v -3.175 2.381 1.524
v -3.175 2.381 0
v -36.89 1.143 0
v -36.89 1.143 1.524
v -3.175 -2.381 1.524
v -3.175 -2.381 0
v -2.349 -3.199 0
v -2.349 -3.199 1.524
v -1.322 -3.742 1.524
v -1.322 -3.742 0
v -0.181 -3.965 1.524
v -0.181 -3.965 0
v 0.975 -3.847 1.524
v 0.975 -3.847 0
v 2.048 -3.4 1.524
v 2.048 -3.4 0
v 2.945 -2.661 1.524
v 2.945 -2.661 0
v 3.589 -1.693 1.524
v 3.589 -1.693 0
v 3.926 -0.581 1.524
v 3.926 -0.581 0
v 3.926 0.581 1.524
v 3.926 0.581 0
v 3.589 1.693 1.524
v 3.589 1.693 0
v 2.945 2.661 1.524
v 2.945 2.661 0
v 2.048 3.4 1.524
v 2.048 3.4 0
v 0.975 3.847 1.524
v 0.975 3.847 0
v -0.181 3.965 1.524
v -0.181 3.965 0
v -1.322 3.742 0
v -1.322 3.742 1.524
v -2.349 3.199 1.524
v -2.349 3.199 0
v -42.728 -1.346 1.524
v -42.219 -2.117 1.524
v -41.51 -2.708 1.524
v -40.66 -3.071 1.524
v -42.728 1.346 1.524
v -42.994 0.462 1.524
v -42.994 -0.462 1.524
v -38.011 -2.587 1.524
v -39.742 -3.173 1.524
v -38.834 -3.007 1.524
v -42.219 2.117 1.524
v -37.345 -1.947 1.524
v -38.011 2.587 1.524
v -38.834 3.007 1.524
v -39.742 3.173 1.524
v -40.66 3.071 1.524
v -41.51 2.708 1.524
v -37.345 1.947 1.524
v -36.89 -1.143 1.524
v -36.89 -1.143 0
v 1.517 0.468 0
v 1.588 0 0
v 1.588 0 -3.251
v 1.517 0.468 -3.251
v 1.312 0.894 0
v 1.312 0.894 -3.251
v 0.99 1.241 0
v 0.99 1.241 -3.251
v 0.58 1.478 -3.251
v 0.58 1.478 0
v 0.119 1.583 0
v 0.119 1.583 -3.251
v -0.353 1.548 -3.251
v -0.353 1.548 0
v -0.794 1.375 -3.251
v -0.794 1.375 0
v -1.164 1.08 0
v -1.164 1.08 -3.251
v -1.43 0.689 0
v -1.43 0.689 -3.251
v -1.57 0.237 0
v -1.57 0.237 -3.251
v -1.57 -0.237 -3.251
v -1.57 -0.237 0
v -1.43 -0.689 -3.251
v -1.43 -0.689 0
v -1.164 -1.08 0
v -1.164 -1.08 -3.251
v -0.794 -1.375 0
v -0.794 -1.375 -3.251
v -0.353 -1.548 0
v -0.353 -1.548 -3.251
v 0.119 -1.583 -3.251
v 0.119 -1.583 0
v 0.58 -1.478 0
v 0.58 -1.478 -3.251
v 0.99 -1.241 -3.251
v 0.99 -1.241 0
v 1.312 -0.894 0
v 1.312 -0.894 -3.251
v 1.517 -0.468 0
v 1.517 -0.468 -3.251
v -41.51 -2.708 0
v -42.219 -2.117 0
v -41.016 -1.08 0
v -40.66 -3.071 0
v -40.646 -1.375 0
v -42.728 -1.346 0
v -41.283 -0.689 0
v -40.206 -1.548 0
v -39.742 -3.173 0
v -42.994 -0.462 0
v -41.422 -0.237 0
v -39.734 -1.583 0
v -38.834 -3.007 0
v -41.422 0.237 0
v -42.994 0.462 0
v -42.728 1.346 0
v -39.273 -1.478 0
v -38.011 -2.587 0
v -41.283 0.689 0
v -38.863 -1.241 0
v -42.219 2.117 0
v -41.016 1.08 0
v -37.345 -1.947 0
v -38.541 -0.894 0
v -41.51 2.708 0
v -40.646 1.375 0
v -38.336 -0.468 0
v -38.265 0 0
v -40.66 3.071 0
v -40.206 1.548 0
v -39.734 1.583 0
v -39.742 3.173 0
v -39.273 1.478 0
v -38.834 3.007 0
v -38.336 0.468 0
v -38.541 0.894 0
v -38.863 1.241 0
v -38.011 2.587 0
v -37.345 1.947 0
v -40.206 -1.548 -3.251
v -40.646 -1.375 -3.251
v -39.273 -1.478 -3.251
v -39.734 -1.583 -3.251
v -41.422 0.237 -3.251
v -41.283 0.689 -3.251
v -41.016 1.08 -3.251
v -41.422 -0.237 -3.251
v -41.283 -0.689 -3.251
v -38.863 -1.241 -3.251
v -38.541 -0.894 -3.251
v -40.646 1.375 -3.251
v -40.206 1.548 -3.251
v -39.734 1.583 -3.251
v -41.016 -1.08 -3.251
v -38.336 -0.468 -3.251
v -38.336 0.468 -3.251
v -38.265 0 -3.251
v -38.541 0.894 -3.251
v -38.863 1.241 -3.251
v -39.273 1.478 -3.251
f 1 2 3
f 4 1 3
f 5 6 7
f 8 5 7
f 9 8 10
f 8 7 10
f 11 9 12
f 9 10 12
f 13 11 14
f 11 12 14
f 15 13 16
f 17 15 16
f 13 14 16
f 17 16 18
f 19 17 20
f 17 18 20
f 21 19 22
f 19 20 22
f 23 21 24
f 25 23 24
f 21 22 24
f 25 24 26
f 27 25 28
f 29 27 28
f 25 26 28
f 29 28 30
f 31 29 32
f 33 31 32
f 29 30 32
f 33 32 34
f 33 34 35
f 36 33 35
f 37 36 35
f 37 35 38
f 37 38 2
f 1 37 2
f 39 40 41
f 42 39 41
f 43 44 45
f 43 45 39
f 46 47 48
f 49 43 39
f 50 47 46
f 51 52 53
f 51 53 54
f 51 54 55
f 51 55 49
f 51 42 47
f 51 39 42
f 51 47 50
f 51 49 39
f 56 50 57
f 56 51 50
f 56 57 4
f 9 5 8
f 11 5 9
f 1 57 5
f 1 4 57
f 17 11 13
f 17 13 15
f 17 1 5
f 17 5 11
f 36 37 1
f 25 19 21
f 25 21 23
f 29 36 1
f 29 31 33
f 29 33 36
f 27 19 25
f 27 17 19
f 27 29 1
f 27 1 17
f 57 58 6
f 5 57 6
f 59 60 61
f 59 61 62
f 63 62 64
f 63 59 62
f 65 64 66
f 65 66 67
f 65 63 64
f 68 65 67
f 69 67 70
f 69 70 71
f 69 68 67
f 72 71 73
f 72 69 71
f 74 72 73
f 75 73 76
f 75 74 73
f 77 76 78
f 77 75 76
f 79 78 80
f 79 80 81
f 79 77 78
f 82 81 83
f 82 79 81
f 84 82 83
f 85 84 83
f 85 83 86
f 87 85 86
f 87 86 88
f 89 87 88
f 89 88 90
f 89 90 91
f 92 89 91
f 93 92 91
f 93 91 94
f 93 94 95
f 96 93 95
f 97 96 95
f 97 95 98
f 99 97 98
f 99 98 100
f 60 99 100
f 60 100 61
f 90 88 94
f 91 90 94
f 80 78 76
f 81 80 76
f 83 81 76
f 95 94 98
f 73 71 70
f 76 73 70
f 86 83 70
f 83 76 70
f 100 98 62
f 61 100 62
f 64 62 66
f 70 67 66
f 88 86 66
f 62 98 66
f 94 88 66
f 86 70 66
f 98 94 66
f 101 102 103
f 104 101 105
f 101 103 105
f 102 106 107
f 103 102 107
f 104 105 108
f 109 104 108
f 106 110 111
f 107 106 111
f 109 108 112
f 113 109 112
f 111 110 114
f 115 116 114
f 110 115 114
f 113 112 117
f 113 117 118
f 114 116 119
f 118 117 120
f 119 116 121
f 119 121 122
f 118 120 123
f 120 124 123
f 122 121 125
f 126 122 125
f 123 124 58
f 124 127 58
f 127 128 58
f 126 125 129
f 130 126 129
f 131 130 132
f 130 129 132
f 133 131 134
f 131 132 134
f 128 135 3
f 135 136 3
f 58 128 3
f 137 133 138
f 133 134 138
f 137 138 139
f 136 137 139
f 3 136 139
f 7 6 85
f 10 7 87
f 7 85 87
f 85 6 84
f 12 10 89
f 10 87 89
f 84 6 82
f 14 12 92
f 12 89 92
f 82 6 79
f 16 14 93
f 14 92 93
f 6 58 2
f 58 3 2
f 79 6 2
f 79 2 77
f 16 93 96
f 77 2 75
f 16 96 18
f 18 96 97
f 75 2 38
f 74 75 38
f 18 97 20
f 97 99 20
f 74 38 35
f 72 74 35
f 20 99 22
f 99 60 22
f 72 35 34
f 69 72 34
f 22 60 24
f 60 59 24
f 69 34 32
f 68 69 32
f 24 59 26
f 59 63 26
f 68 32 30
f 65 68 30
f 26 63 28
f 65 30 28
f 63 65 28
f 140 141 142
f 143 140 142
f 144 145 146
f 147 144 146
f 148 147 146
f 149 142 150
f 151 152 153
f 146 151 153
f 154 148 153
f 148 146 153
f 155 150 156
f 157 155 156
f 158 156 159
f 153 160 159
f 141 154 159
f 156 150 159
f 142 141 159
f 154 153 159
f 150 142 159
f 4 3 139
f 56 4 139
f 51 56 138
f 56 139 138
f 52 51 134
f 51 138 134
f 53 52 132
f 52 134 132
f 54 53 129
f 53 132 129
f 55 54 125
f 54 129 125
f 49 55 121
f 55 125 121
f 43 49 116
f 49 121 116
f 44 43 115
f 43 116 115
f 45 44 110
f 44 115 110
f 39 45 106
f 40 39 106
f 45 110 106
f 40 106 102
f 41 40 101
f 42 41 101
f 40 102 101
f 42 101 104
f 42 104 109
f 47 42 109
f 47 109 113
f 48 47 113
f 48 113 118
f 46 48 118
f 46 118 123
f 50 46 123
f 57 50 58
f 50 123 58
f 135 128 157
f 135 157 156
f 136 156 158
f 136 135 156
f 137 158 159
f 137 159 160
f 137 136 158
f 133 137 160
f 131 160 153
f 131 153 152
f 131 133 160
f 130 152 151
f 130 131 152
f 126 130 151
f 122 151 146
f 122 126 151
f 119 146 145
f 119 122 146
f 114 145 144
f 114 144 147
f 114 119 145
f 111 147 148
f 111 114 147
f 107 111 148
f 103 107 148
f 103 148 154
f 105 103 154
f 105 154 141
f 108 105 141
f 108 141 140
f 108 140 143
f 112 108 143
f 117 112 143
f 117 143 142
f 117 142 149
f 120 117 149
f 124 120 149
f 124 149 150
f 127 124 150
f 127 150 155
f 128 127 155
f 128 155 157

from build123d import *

# Parameters (mm, degrees)
F0_R     = 1.5875
F1_DEPTH = 1.524
F2_R     = 1.5875
F3_DEPTH = 4.7752


with BuildPart() as f1:
    # F0 (on Top) → F1 (new body)
    with BuildSketch(Plane.XY):
        with BuildLine():
            Line((-36.890476, -1.143), (-3.175, -2.38125))
            ThreePointArc((-3.175, -2.38125), (3.96875, 0), (-3.175, 2.38125))
            Line((-3.175, 2.38125), (-36.890476, 1.143))
            ThreePointArc((-36.890476, 1.143), (-43.0276, 0), (-36.890476, -1.143))
        make_face()
        with Locations((-39.8526, 0)):
            Circle(F0_R, mode=Mode.SUBTRACT)
        Circle(F0_R, mode=Mode.SUBTRACT)
    extrude(amount=F1_DEPTH)

    # F2 (on face) → F3 (join)
    with BuildSketch(Plane.XY.offset(1.524)):
        with Locations((-39.8526, 0)):
            Circle(F2_R)
        Circle(F2_R)
    extrude(amount=-F3_DEPTH)


solid = f1.part
